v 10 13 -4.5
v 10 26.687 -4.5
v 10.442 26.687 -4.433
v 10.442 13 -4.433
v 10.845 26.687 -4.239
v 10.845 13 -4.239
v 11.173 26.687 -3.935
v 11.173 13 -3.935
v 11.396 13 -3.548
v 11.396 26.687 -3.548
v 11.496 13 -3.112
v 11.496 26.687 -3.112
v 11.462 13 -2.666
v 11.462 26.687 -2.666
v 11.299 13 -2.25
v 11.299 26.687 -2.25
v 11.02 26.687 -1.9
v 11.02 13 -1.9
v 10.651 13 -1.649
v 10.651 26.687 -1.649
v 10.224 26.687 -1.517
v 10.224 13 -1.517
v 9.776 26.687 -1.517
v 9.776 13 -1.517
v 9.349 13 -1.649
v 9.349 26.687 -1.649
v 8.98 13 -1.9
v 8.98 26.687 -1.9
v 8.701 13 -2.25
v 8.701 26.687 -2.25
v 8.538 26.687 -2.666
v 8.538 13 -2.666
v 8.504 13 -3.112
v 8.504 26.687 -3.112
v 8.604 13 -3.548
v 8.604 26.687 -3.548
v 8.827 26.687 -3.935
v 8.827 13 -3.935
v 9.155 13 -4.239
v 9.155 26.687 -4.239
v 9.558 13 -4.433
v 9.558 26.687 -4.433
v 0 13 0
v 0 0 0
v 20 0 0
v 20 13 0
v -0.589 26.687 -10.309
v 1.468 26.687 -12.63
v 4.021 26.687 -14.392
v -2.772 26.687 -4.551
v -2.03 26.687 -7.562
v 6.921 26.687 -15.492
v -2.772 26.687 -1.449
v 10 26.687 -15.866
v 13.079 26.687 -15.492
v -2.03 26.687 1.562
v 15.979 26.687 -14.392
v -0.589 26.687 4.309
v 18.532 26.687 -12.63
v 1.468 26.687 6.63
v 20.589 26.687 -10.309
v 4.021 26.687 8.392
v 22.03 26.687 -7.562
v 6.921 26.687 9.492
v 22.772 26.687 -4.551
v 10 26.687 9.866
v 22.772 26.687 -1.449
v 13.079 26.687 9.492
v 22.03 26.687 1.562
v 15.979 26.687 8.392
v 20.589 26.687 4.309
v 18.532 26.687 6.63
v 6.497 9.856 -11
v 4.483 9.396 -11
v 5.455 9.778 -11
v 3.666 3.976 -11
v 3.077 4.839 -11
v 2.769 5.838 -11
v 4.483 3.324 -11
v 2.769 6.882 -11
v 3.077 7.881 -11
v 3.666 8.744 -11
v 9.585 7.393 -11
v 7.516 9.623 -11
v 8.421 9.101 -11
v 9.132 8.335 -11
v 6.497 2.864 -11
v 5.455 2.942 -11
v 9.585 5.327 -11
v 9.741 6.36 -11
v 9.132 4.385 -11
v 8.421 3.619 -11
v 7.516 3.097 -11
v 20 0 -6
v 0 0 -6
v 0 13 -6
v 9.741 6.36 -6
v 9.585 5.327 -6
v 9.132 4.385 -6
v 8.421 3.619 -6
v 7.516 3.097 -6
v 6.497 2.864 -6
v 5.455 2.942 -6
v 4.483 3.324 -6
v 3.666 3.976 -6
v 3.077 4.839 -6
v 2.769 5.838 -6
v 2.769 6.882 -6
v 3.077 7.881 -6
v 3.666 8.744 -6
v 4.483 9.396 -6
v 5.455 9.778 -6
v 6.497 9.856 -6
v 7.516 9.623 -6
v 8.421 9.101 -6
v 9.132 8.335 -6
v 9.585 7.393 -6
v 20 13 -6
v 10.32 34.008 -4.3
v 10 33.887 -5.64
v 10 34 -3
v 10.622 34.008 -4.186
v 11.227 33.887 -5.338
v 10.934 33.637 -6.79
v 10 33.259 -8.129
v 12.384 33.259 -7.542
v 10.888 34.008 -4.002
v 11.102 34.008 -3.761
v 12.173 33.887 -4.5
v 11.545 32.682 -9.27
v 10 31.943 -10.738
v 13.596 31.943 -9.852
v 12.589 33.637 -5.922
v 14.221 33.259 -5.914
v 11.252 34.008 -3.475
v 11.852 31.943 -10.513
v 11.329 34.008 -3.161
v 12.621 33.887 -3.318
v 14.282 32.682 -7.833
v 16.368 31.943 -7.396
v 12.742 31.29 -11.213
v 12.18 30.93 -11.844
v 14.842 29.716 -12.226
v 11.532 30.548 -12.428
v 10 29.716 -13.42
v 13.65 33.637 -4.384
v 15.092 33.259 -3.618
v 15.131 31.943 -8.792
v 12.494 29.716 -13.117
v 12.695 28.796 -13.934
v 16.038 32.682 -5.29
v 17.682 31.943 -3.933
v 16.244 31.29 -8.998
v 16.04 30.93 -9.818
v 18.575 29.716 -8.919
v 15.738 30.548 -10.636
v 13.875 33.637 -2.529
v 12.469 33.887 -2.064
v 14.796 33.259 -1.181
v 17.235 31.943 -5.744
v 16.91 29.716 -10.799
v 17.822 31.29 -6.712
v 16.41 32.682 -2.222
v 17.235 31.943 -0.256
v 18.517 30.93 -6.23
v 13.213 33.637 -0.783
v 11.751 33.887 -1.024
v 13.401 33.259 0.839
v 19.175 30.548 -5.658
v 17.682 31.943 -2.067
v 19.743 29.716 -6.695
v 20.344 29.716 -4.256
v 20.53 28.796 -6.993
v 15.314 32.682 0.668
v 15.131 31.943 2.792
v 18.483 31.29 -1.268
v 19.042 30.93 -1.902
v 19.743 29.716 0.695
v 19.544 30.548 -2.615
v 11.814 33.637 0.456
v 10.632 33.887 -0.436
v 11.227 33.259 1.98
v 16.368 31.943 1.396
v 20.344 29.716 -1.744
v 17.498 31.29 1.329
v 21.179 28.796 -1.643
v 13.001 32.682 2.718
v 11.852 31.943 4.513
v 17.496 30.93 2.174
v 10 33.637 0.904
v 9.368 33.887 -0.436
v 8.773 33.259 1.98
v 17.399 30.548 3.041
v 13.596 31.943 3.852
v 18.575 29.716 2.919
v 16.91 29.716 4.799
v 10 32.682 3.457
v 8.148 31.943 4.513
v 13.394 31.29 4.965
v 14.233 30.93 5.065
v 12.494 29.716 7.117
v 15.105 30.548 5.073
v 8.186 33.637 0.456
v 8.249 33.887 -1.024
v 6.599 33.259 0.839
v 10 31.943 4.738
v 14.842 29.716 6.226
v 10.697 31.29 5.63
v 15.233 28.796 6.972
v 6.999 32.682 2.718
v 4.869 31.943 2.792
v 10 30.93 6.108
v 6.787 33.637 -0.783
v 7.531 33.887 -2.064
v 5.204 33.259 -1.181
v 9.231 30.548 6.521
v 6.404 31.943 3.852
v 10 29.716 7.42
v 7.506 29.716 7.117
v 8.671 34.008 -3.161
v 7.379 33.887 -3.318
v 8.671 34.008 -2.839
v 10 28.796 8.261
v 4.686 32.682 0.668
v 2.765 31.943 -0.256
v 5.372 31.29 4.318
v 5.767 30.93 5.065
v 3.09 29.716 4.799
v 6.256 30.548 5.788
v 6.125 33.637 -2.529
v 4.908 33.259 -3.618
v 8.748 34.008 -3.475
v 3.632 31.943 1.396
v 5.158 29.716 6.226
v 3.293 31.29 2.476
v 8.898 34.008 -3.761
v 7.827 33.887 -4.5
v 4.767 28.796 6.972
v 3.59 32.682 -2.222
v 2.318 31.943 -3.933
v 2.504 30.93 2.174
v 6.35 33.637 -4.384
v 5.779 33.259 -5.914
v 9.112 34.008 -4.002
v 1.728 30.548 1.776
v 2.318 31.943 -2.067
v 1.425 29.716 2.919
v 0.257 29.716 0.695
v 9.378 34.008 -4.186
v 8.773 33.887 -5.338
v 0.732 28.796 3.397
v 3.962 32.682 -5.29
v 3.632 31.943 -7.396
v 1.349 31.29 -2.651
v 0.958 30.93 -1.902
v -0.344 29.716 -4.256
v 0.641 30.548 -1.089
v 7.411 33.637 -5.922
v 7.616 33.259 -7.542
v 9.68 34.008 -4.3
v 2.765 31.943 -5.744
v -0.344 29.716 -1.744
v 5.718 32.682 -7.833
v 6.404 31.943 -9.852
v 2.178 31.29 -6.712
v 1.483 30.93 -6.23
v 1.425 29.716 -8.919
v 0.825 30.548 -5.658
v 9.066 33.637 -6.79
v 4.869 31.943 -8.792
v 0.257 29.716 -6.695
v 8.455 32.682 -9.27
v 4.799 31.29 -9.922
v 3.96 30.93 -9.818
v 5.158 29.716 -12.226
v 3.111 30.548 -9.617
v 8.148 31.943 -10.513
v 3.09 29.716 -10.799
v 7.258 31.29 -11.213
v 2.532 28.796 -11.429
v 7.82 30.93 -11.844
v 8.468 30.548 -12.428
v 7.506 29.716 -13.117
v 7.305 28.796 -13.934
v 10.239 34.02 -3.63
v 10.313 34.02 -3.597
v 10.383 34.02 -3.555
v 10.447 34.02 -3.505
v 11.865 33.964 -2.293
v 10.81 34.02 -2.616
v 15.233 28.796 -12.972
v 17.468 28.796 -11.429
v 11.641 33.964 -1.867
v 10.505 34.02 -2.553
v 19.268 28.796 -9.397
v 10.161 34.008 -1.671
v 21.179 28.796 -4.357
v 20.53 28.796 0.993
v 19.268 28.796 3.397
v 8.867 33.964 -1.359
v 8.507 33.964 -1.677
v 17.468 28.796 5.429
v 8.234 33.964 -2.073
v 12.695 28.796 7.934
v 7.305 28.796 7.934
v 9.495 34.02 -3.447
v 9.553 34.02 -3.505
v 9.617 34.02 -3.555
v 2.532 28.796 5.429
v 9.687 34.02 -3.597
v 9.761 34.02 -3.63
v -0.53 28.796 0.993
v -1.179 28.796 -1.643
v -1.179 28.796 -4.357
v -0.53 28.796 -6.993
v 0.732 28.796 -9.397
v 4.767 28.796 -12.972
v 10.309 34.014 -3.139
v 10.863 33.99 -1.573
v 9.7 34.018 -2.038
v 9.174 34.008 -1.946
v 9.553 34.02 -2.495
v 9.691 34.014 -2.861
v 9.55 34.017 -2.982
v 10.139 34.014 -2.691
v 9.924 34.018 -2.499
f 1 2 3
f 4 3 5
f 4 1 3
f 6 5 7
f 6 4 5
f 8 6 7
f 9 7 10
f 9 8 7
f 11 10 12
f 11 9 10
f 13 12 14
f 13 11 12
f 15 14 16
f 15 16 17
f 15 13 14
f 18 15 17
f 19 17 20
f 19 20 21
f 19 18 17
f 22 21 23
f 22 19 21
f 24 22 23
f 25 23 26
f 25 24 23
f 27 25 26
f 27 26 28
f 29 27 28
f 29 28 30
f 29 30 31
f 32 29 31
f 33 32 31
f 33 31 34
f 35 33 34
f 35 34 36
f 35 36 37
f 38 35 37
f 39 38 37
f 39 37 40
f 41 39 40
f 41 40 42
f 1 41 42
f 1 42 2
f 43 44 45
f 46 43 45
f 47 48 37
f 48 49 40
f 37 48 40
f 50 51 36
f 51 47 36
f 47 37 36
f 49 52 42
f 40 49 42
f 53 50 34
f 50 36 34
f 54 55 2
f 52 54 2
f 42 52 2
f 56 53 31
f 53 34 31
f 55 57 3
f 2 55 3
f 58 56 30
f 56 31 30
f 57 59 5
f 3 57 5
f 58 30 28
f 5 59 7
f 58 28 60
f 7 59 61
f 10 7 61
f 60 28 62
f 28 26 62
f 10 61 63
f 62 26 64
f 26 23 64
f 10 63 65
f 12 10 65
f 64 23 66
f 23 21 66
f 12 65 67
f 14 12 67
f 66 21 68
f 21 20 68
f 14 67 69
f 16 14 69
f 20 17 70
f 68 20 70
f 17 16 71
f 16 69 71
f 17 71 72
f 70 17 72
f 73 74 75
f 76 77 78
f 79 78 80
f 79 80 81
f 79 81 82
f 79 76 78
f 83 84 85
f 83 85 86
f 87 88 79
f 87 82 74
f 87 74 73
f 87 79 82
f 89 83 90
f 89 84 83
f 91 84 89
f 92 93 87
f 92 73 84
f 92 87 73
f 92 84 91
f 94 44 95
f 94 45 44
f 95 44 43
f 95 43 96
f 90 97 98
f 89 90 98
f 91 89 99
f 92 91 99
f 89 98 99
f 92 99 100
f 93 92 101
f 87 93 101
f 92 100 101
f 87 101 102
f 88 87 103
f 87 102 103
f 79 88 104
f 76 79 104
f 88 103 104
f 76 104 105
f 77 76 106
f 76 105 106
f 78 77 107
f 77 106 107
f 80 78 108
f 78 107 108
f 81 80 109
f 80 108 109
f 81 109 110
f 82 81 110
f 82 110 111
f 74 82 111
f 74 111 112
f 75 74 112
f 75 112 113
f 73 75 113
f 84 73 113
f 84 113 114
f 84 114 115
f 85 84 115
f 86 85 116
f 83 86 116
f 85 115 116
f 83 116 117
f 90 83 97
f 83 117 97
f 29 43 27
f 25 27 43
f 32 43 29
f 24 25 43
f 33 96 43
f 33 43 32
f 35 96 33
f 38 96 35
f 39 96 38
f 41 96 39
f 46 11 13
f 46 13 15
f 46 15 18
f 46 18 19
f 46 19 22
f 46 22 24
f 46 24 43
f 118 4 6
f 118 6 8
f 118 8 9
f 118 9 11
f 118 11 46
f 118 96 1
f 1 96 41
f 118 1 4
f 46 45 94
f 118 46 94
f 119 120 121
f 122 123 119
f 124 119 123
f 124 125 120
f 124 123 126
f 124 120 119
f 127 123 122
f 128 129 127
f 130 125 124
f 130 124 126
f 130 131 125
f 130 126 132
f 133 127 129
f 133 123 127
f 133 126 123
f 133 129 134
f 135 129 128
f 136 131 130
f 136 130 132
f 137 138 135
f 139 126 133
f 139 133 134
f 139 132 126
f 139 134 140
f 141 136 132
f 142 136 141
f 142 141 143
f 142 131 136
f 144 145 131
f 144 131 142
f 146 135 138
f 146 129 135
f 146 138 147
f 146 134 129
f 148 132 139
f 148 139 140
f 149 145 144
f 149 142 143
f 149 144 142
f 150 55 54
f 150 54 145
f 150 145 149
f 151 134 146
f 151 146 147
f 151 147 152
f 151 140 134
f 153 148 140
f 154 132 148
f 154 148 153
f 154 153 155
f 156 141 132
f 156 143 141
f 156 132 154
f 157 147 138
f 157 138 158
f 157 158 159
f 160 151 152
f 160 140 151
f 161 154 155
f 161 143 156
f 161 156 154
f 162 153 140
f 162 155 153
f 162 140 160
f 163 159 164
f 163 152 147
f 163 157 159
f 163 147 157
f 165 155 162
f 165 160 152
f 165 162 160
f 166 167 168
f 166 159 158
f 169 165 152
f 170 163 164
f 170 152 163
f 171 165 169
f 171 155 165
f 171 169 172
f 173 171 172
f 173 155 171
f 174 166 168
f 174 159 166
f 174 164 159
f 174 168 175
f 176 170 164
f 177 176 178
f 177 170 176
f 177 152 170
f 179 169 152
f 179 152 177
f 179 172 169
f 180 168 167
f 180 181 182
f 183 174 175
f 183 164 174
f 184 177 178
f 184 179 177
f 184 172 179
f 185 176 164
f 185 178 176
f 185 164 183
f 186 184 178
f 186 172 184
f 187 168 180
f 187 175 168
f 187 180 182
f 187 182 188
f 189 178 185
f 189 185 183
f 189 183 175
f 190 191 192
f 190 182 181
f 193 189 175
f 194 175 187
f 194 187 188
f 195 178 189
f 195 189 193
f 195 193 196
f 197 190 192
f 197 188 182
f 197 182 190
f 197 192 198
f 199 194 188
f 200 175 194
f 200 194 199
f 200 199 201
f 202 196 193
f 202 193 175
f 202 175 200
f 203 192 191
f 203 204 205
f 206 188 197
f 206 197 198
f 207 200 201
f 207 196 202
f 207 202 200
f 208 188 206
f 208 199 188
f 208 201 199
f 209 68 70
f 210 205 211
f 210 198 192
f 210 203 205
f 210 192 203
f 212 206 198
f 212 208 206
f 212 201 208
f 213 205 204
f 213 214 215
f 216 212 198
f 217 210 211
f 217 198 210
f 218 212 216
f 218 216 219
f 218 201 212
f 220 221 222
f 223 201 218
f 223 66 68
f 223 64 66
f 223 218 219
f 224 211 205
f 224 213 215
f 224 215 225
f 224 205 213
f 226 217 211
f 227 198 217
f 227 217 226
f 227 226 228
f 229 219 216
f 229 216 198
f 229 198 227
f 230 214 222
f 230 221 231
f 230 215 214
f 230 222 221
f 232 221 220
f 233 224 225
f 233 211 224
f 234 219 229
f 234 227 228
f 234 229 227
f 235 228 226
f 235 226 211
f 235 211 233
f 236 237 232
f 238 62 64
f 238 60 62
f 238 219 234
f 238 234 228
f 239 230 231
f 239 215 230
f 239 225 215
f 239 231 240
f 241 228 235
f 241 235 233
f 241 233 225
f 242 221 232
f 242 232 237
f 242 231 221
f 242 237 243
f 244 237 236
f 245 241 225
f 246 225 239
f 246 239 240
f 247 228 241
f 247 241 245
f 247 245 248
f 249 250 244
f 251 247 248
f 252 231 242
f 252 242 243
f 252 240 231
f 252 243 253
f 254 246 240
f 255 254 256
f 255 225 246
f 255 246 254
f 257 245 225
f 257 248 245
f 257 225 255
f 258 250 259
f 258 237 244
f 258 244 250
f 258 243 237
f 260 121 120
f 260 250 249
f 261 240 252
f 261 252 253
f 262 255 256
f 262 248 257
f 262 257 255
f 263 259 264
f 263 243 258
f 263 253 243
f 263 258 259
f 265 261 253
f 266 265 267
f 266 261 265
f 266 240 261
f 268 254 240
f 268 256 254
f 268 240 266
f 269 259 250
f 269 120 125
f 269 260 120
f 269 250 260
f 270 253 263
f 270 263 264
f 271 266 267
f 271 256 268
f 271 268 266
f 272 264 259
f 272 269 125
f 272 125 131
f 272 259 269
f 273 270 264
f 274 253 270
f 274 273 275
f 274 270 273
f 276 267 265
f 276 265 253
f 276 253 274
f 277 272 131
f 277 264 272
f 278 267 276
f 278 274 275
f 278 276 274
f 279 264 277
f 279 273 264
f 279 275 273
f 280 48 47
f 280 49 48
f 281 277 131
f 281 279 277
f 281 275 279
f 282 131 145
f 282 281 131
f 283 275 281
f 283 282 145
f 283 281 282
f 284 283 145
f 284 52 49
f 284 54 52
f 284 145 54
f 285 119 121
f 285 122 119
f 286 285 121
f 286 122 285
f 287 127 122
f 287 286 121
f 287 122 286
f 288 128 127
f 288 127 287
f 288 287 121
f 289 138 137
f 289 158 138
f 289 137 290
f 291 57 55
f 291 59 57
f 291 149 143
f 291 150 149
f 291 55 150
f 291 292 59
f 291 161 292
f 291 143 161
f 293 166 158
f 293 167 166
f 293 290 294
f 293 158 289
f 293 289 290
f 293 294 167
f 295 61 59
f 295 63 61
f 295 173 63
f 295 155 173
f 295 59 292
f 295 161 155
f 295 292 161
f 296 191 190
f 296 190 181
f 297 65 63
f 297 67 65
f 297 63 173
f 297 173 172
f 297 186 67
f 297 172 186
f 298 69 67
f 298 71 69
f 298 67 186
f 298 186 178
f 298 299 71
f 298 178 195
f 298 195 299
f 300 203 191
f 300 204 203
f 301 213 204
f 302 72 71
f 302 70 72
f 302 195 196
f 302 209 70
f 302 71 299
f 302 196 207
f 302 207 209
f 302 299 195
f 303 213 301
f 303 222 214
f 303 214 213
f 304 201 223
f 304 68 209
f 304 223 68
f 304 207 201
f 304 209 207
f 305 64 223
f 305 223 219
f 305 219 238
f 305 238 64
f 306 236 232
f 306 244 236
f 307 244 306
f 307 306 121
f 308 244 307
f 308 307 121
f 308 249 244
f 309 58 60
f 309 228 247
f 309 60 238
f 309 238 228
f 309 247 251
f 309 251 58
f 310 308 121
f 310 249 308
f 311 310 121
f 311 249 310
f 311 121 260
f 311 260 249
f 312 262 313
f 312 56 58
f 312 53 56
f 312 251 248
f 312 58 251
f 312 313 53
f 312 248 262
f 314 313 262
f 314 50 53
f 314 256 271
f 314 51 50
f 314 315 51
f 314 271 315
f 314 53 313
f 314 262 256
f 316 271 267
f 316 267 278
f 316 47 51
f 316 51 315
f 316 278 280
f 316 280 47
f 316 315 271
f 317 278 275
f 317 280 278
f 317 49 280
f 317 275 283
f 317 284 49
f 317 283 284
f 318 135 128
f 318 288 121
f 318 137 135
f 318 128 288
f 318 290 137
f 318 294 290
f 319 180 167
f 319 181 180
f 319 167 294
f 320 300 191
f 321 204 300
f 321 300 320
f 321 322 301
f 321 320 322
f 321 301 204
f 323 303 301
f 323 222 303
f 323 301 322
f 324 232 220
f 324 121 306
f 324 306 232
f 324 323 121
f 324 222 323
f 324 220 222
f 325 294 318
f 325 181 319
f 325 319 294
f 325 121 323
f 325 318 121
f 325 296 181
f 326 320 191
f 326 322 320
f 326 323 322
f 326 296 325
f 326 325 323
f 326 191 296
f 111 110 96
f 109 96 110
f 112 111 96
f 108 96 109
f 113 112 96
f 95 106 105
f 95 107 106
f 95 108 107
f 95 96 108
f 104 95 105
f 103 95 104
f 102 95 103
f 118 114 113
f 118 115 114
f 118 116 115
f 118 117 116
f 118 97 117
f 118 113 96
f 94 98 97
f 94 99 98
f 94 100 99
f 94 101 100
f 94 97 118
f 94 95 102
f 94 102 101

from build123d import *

# Parameters (mm, degrees)
SKETCH1_W           = 20
SKETCH1_H           = 6
BOSS_EXTRUDE1_DEPTH = 13
SKETCH2_R           = 1.5
BOSS_EXTRUDE3_DEPTH = 34
SKETCH6_R           = 3.50549755
BOSS_EXTRUDE4_DEPTH = 5


with BuildPart() as part:
    # Sketch1 → Boss-Extrude1 (new body)
    with BuildSketch(Plane(origin=(0, 0, 0), x_dir=(1, 0, 0), z_dir=(0, 1, 0))):
        with Locations((10, 3)):
            Rectangle(SKETCH1_W, SKETCH1_H)
    extrude(amount=BOSS_EXTRUDE1_DEPTH)

    # Sketch2 → Boss-Extrude3 (add)
    with BuildSketch(Plane.XZ):
        with Locations(Location((10, -3, 0), (0, 0, 270))):
            Circle(SKETCH2_R)
    extrude(amount=-BOSS_EXTRUDE3_DEPTH)

    # Sketch5 → Revolve1 (revolve)
    with BuildSketch(Plane.XY.offset(-3), mode=Mode.PRIVATE) as revolve1_sk:
        with BuildLine():
            Line((10, 34), (10, 26.687164187))
            Line((10, 26.687164187), (-2.865987709, 26.687164187))
            add(Edge.make_bspline(
                [(10, 34), (2.373080753, 34.40580884), (-2.865987709, 26.687164187)],
                knots=[0, 0, 0, 1, 1, 1], degree=2))
        make_face()
    revolve(revolve1_sk.sketch.rotate(Axis((10, 34, -3), (0, -1, 0)), 90), axis=Axis((10, 34, -3), (0, -1, 0)))

    # Sketch6 → Boss-Extrude4 (add)
    with BuildSketch(Plane(origin=(0, 0, -6), x_dir=(-1, 0, 0), z_dir=(0, 0, -1))):
        with Locations(Location((-6.235505229, 6.359969697, 0), (0, 0, 180))):
            Circle(SKETCH6_R)
    extrude(amount=BOSS_EXTRUDE4_DEPTH)


solid = part.part
